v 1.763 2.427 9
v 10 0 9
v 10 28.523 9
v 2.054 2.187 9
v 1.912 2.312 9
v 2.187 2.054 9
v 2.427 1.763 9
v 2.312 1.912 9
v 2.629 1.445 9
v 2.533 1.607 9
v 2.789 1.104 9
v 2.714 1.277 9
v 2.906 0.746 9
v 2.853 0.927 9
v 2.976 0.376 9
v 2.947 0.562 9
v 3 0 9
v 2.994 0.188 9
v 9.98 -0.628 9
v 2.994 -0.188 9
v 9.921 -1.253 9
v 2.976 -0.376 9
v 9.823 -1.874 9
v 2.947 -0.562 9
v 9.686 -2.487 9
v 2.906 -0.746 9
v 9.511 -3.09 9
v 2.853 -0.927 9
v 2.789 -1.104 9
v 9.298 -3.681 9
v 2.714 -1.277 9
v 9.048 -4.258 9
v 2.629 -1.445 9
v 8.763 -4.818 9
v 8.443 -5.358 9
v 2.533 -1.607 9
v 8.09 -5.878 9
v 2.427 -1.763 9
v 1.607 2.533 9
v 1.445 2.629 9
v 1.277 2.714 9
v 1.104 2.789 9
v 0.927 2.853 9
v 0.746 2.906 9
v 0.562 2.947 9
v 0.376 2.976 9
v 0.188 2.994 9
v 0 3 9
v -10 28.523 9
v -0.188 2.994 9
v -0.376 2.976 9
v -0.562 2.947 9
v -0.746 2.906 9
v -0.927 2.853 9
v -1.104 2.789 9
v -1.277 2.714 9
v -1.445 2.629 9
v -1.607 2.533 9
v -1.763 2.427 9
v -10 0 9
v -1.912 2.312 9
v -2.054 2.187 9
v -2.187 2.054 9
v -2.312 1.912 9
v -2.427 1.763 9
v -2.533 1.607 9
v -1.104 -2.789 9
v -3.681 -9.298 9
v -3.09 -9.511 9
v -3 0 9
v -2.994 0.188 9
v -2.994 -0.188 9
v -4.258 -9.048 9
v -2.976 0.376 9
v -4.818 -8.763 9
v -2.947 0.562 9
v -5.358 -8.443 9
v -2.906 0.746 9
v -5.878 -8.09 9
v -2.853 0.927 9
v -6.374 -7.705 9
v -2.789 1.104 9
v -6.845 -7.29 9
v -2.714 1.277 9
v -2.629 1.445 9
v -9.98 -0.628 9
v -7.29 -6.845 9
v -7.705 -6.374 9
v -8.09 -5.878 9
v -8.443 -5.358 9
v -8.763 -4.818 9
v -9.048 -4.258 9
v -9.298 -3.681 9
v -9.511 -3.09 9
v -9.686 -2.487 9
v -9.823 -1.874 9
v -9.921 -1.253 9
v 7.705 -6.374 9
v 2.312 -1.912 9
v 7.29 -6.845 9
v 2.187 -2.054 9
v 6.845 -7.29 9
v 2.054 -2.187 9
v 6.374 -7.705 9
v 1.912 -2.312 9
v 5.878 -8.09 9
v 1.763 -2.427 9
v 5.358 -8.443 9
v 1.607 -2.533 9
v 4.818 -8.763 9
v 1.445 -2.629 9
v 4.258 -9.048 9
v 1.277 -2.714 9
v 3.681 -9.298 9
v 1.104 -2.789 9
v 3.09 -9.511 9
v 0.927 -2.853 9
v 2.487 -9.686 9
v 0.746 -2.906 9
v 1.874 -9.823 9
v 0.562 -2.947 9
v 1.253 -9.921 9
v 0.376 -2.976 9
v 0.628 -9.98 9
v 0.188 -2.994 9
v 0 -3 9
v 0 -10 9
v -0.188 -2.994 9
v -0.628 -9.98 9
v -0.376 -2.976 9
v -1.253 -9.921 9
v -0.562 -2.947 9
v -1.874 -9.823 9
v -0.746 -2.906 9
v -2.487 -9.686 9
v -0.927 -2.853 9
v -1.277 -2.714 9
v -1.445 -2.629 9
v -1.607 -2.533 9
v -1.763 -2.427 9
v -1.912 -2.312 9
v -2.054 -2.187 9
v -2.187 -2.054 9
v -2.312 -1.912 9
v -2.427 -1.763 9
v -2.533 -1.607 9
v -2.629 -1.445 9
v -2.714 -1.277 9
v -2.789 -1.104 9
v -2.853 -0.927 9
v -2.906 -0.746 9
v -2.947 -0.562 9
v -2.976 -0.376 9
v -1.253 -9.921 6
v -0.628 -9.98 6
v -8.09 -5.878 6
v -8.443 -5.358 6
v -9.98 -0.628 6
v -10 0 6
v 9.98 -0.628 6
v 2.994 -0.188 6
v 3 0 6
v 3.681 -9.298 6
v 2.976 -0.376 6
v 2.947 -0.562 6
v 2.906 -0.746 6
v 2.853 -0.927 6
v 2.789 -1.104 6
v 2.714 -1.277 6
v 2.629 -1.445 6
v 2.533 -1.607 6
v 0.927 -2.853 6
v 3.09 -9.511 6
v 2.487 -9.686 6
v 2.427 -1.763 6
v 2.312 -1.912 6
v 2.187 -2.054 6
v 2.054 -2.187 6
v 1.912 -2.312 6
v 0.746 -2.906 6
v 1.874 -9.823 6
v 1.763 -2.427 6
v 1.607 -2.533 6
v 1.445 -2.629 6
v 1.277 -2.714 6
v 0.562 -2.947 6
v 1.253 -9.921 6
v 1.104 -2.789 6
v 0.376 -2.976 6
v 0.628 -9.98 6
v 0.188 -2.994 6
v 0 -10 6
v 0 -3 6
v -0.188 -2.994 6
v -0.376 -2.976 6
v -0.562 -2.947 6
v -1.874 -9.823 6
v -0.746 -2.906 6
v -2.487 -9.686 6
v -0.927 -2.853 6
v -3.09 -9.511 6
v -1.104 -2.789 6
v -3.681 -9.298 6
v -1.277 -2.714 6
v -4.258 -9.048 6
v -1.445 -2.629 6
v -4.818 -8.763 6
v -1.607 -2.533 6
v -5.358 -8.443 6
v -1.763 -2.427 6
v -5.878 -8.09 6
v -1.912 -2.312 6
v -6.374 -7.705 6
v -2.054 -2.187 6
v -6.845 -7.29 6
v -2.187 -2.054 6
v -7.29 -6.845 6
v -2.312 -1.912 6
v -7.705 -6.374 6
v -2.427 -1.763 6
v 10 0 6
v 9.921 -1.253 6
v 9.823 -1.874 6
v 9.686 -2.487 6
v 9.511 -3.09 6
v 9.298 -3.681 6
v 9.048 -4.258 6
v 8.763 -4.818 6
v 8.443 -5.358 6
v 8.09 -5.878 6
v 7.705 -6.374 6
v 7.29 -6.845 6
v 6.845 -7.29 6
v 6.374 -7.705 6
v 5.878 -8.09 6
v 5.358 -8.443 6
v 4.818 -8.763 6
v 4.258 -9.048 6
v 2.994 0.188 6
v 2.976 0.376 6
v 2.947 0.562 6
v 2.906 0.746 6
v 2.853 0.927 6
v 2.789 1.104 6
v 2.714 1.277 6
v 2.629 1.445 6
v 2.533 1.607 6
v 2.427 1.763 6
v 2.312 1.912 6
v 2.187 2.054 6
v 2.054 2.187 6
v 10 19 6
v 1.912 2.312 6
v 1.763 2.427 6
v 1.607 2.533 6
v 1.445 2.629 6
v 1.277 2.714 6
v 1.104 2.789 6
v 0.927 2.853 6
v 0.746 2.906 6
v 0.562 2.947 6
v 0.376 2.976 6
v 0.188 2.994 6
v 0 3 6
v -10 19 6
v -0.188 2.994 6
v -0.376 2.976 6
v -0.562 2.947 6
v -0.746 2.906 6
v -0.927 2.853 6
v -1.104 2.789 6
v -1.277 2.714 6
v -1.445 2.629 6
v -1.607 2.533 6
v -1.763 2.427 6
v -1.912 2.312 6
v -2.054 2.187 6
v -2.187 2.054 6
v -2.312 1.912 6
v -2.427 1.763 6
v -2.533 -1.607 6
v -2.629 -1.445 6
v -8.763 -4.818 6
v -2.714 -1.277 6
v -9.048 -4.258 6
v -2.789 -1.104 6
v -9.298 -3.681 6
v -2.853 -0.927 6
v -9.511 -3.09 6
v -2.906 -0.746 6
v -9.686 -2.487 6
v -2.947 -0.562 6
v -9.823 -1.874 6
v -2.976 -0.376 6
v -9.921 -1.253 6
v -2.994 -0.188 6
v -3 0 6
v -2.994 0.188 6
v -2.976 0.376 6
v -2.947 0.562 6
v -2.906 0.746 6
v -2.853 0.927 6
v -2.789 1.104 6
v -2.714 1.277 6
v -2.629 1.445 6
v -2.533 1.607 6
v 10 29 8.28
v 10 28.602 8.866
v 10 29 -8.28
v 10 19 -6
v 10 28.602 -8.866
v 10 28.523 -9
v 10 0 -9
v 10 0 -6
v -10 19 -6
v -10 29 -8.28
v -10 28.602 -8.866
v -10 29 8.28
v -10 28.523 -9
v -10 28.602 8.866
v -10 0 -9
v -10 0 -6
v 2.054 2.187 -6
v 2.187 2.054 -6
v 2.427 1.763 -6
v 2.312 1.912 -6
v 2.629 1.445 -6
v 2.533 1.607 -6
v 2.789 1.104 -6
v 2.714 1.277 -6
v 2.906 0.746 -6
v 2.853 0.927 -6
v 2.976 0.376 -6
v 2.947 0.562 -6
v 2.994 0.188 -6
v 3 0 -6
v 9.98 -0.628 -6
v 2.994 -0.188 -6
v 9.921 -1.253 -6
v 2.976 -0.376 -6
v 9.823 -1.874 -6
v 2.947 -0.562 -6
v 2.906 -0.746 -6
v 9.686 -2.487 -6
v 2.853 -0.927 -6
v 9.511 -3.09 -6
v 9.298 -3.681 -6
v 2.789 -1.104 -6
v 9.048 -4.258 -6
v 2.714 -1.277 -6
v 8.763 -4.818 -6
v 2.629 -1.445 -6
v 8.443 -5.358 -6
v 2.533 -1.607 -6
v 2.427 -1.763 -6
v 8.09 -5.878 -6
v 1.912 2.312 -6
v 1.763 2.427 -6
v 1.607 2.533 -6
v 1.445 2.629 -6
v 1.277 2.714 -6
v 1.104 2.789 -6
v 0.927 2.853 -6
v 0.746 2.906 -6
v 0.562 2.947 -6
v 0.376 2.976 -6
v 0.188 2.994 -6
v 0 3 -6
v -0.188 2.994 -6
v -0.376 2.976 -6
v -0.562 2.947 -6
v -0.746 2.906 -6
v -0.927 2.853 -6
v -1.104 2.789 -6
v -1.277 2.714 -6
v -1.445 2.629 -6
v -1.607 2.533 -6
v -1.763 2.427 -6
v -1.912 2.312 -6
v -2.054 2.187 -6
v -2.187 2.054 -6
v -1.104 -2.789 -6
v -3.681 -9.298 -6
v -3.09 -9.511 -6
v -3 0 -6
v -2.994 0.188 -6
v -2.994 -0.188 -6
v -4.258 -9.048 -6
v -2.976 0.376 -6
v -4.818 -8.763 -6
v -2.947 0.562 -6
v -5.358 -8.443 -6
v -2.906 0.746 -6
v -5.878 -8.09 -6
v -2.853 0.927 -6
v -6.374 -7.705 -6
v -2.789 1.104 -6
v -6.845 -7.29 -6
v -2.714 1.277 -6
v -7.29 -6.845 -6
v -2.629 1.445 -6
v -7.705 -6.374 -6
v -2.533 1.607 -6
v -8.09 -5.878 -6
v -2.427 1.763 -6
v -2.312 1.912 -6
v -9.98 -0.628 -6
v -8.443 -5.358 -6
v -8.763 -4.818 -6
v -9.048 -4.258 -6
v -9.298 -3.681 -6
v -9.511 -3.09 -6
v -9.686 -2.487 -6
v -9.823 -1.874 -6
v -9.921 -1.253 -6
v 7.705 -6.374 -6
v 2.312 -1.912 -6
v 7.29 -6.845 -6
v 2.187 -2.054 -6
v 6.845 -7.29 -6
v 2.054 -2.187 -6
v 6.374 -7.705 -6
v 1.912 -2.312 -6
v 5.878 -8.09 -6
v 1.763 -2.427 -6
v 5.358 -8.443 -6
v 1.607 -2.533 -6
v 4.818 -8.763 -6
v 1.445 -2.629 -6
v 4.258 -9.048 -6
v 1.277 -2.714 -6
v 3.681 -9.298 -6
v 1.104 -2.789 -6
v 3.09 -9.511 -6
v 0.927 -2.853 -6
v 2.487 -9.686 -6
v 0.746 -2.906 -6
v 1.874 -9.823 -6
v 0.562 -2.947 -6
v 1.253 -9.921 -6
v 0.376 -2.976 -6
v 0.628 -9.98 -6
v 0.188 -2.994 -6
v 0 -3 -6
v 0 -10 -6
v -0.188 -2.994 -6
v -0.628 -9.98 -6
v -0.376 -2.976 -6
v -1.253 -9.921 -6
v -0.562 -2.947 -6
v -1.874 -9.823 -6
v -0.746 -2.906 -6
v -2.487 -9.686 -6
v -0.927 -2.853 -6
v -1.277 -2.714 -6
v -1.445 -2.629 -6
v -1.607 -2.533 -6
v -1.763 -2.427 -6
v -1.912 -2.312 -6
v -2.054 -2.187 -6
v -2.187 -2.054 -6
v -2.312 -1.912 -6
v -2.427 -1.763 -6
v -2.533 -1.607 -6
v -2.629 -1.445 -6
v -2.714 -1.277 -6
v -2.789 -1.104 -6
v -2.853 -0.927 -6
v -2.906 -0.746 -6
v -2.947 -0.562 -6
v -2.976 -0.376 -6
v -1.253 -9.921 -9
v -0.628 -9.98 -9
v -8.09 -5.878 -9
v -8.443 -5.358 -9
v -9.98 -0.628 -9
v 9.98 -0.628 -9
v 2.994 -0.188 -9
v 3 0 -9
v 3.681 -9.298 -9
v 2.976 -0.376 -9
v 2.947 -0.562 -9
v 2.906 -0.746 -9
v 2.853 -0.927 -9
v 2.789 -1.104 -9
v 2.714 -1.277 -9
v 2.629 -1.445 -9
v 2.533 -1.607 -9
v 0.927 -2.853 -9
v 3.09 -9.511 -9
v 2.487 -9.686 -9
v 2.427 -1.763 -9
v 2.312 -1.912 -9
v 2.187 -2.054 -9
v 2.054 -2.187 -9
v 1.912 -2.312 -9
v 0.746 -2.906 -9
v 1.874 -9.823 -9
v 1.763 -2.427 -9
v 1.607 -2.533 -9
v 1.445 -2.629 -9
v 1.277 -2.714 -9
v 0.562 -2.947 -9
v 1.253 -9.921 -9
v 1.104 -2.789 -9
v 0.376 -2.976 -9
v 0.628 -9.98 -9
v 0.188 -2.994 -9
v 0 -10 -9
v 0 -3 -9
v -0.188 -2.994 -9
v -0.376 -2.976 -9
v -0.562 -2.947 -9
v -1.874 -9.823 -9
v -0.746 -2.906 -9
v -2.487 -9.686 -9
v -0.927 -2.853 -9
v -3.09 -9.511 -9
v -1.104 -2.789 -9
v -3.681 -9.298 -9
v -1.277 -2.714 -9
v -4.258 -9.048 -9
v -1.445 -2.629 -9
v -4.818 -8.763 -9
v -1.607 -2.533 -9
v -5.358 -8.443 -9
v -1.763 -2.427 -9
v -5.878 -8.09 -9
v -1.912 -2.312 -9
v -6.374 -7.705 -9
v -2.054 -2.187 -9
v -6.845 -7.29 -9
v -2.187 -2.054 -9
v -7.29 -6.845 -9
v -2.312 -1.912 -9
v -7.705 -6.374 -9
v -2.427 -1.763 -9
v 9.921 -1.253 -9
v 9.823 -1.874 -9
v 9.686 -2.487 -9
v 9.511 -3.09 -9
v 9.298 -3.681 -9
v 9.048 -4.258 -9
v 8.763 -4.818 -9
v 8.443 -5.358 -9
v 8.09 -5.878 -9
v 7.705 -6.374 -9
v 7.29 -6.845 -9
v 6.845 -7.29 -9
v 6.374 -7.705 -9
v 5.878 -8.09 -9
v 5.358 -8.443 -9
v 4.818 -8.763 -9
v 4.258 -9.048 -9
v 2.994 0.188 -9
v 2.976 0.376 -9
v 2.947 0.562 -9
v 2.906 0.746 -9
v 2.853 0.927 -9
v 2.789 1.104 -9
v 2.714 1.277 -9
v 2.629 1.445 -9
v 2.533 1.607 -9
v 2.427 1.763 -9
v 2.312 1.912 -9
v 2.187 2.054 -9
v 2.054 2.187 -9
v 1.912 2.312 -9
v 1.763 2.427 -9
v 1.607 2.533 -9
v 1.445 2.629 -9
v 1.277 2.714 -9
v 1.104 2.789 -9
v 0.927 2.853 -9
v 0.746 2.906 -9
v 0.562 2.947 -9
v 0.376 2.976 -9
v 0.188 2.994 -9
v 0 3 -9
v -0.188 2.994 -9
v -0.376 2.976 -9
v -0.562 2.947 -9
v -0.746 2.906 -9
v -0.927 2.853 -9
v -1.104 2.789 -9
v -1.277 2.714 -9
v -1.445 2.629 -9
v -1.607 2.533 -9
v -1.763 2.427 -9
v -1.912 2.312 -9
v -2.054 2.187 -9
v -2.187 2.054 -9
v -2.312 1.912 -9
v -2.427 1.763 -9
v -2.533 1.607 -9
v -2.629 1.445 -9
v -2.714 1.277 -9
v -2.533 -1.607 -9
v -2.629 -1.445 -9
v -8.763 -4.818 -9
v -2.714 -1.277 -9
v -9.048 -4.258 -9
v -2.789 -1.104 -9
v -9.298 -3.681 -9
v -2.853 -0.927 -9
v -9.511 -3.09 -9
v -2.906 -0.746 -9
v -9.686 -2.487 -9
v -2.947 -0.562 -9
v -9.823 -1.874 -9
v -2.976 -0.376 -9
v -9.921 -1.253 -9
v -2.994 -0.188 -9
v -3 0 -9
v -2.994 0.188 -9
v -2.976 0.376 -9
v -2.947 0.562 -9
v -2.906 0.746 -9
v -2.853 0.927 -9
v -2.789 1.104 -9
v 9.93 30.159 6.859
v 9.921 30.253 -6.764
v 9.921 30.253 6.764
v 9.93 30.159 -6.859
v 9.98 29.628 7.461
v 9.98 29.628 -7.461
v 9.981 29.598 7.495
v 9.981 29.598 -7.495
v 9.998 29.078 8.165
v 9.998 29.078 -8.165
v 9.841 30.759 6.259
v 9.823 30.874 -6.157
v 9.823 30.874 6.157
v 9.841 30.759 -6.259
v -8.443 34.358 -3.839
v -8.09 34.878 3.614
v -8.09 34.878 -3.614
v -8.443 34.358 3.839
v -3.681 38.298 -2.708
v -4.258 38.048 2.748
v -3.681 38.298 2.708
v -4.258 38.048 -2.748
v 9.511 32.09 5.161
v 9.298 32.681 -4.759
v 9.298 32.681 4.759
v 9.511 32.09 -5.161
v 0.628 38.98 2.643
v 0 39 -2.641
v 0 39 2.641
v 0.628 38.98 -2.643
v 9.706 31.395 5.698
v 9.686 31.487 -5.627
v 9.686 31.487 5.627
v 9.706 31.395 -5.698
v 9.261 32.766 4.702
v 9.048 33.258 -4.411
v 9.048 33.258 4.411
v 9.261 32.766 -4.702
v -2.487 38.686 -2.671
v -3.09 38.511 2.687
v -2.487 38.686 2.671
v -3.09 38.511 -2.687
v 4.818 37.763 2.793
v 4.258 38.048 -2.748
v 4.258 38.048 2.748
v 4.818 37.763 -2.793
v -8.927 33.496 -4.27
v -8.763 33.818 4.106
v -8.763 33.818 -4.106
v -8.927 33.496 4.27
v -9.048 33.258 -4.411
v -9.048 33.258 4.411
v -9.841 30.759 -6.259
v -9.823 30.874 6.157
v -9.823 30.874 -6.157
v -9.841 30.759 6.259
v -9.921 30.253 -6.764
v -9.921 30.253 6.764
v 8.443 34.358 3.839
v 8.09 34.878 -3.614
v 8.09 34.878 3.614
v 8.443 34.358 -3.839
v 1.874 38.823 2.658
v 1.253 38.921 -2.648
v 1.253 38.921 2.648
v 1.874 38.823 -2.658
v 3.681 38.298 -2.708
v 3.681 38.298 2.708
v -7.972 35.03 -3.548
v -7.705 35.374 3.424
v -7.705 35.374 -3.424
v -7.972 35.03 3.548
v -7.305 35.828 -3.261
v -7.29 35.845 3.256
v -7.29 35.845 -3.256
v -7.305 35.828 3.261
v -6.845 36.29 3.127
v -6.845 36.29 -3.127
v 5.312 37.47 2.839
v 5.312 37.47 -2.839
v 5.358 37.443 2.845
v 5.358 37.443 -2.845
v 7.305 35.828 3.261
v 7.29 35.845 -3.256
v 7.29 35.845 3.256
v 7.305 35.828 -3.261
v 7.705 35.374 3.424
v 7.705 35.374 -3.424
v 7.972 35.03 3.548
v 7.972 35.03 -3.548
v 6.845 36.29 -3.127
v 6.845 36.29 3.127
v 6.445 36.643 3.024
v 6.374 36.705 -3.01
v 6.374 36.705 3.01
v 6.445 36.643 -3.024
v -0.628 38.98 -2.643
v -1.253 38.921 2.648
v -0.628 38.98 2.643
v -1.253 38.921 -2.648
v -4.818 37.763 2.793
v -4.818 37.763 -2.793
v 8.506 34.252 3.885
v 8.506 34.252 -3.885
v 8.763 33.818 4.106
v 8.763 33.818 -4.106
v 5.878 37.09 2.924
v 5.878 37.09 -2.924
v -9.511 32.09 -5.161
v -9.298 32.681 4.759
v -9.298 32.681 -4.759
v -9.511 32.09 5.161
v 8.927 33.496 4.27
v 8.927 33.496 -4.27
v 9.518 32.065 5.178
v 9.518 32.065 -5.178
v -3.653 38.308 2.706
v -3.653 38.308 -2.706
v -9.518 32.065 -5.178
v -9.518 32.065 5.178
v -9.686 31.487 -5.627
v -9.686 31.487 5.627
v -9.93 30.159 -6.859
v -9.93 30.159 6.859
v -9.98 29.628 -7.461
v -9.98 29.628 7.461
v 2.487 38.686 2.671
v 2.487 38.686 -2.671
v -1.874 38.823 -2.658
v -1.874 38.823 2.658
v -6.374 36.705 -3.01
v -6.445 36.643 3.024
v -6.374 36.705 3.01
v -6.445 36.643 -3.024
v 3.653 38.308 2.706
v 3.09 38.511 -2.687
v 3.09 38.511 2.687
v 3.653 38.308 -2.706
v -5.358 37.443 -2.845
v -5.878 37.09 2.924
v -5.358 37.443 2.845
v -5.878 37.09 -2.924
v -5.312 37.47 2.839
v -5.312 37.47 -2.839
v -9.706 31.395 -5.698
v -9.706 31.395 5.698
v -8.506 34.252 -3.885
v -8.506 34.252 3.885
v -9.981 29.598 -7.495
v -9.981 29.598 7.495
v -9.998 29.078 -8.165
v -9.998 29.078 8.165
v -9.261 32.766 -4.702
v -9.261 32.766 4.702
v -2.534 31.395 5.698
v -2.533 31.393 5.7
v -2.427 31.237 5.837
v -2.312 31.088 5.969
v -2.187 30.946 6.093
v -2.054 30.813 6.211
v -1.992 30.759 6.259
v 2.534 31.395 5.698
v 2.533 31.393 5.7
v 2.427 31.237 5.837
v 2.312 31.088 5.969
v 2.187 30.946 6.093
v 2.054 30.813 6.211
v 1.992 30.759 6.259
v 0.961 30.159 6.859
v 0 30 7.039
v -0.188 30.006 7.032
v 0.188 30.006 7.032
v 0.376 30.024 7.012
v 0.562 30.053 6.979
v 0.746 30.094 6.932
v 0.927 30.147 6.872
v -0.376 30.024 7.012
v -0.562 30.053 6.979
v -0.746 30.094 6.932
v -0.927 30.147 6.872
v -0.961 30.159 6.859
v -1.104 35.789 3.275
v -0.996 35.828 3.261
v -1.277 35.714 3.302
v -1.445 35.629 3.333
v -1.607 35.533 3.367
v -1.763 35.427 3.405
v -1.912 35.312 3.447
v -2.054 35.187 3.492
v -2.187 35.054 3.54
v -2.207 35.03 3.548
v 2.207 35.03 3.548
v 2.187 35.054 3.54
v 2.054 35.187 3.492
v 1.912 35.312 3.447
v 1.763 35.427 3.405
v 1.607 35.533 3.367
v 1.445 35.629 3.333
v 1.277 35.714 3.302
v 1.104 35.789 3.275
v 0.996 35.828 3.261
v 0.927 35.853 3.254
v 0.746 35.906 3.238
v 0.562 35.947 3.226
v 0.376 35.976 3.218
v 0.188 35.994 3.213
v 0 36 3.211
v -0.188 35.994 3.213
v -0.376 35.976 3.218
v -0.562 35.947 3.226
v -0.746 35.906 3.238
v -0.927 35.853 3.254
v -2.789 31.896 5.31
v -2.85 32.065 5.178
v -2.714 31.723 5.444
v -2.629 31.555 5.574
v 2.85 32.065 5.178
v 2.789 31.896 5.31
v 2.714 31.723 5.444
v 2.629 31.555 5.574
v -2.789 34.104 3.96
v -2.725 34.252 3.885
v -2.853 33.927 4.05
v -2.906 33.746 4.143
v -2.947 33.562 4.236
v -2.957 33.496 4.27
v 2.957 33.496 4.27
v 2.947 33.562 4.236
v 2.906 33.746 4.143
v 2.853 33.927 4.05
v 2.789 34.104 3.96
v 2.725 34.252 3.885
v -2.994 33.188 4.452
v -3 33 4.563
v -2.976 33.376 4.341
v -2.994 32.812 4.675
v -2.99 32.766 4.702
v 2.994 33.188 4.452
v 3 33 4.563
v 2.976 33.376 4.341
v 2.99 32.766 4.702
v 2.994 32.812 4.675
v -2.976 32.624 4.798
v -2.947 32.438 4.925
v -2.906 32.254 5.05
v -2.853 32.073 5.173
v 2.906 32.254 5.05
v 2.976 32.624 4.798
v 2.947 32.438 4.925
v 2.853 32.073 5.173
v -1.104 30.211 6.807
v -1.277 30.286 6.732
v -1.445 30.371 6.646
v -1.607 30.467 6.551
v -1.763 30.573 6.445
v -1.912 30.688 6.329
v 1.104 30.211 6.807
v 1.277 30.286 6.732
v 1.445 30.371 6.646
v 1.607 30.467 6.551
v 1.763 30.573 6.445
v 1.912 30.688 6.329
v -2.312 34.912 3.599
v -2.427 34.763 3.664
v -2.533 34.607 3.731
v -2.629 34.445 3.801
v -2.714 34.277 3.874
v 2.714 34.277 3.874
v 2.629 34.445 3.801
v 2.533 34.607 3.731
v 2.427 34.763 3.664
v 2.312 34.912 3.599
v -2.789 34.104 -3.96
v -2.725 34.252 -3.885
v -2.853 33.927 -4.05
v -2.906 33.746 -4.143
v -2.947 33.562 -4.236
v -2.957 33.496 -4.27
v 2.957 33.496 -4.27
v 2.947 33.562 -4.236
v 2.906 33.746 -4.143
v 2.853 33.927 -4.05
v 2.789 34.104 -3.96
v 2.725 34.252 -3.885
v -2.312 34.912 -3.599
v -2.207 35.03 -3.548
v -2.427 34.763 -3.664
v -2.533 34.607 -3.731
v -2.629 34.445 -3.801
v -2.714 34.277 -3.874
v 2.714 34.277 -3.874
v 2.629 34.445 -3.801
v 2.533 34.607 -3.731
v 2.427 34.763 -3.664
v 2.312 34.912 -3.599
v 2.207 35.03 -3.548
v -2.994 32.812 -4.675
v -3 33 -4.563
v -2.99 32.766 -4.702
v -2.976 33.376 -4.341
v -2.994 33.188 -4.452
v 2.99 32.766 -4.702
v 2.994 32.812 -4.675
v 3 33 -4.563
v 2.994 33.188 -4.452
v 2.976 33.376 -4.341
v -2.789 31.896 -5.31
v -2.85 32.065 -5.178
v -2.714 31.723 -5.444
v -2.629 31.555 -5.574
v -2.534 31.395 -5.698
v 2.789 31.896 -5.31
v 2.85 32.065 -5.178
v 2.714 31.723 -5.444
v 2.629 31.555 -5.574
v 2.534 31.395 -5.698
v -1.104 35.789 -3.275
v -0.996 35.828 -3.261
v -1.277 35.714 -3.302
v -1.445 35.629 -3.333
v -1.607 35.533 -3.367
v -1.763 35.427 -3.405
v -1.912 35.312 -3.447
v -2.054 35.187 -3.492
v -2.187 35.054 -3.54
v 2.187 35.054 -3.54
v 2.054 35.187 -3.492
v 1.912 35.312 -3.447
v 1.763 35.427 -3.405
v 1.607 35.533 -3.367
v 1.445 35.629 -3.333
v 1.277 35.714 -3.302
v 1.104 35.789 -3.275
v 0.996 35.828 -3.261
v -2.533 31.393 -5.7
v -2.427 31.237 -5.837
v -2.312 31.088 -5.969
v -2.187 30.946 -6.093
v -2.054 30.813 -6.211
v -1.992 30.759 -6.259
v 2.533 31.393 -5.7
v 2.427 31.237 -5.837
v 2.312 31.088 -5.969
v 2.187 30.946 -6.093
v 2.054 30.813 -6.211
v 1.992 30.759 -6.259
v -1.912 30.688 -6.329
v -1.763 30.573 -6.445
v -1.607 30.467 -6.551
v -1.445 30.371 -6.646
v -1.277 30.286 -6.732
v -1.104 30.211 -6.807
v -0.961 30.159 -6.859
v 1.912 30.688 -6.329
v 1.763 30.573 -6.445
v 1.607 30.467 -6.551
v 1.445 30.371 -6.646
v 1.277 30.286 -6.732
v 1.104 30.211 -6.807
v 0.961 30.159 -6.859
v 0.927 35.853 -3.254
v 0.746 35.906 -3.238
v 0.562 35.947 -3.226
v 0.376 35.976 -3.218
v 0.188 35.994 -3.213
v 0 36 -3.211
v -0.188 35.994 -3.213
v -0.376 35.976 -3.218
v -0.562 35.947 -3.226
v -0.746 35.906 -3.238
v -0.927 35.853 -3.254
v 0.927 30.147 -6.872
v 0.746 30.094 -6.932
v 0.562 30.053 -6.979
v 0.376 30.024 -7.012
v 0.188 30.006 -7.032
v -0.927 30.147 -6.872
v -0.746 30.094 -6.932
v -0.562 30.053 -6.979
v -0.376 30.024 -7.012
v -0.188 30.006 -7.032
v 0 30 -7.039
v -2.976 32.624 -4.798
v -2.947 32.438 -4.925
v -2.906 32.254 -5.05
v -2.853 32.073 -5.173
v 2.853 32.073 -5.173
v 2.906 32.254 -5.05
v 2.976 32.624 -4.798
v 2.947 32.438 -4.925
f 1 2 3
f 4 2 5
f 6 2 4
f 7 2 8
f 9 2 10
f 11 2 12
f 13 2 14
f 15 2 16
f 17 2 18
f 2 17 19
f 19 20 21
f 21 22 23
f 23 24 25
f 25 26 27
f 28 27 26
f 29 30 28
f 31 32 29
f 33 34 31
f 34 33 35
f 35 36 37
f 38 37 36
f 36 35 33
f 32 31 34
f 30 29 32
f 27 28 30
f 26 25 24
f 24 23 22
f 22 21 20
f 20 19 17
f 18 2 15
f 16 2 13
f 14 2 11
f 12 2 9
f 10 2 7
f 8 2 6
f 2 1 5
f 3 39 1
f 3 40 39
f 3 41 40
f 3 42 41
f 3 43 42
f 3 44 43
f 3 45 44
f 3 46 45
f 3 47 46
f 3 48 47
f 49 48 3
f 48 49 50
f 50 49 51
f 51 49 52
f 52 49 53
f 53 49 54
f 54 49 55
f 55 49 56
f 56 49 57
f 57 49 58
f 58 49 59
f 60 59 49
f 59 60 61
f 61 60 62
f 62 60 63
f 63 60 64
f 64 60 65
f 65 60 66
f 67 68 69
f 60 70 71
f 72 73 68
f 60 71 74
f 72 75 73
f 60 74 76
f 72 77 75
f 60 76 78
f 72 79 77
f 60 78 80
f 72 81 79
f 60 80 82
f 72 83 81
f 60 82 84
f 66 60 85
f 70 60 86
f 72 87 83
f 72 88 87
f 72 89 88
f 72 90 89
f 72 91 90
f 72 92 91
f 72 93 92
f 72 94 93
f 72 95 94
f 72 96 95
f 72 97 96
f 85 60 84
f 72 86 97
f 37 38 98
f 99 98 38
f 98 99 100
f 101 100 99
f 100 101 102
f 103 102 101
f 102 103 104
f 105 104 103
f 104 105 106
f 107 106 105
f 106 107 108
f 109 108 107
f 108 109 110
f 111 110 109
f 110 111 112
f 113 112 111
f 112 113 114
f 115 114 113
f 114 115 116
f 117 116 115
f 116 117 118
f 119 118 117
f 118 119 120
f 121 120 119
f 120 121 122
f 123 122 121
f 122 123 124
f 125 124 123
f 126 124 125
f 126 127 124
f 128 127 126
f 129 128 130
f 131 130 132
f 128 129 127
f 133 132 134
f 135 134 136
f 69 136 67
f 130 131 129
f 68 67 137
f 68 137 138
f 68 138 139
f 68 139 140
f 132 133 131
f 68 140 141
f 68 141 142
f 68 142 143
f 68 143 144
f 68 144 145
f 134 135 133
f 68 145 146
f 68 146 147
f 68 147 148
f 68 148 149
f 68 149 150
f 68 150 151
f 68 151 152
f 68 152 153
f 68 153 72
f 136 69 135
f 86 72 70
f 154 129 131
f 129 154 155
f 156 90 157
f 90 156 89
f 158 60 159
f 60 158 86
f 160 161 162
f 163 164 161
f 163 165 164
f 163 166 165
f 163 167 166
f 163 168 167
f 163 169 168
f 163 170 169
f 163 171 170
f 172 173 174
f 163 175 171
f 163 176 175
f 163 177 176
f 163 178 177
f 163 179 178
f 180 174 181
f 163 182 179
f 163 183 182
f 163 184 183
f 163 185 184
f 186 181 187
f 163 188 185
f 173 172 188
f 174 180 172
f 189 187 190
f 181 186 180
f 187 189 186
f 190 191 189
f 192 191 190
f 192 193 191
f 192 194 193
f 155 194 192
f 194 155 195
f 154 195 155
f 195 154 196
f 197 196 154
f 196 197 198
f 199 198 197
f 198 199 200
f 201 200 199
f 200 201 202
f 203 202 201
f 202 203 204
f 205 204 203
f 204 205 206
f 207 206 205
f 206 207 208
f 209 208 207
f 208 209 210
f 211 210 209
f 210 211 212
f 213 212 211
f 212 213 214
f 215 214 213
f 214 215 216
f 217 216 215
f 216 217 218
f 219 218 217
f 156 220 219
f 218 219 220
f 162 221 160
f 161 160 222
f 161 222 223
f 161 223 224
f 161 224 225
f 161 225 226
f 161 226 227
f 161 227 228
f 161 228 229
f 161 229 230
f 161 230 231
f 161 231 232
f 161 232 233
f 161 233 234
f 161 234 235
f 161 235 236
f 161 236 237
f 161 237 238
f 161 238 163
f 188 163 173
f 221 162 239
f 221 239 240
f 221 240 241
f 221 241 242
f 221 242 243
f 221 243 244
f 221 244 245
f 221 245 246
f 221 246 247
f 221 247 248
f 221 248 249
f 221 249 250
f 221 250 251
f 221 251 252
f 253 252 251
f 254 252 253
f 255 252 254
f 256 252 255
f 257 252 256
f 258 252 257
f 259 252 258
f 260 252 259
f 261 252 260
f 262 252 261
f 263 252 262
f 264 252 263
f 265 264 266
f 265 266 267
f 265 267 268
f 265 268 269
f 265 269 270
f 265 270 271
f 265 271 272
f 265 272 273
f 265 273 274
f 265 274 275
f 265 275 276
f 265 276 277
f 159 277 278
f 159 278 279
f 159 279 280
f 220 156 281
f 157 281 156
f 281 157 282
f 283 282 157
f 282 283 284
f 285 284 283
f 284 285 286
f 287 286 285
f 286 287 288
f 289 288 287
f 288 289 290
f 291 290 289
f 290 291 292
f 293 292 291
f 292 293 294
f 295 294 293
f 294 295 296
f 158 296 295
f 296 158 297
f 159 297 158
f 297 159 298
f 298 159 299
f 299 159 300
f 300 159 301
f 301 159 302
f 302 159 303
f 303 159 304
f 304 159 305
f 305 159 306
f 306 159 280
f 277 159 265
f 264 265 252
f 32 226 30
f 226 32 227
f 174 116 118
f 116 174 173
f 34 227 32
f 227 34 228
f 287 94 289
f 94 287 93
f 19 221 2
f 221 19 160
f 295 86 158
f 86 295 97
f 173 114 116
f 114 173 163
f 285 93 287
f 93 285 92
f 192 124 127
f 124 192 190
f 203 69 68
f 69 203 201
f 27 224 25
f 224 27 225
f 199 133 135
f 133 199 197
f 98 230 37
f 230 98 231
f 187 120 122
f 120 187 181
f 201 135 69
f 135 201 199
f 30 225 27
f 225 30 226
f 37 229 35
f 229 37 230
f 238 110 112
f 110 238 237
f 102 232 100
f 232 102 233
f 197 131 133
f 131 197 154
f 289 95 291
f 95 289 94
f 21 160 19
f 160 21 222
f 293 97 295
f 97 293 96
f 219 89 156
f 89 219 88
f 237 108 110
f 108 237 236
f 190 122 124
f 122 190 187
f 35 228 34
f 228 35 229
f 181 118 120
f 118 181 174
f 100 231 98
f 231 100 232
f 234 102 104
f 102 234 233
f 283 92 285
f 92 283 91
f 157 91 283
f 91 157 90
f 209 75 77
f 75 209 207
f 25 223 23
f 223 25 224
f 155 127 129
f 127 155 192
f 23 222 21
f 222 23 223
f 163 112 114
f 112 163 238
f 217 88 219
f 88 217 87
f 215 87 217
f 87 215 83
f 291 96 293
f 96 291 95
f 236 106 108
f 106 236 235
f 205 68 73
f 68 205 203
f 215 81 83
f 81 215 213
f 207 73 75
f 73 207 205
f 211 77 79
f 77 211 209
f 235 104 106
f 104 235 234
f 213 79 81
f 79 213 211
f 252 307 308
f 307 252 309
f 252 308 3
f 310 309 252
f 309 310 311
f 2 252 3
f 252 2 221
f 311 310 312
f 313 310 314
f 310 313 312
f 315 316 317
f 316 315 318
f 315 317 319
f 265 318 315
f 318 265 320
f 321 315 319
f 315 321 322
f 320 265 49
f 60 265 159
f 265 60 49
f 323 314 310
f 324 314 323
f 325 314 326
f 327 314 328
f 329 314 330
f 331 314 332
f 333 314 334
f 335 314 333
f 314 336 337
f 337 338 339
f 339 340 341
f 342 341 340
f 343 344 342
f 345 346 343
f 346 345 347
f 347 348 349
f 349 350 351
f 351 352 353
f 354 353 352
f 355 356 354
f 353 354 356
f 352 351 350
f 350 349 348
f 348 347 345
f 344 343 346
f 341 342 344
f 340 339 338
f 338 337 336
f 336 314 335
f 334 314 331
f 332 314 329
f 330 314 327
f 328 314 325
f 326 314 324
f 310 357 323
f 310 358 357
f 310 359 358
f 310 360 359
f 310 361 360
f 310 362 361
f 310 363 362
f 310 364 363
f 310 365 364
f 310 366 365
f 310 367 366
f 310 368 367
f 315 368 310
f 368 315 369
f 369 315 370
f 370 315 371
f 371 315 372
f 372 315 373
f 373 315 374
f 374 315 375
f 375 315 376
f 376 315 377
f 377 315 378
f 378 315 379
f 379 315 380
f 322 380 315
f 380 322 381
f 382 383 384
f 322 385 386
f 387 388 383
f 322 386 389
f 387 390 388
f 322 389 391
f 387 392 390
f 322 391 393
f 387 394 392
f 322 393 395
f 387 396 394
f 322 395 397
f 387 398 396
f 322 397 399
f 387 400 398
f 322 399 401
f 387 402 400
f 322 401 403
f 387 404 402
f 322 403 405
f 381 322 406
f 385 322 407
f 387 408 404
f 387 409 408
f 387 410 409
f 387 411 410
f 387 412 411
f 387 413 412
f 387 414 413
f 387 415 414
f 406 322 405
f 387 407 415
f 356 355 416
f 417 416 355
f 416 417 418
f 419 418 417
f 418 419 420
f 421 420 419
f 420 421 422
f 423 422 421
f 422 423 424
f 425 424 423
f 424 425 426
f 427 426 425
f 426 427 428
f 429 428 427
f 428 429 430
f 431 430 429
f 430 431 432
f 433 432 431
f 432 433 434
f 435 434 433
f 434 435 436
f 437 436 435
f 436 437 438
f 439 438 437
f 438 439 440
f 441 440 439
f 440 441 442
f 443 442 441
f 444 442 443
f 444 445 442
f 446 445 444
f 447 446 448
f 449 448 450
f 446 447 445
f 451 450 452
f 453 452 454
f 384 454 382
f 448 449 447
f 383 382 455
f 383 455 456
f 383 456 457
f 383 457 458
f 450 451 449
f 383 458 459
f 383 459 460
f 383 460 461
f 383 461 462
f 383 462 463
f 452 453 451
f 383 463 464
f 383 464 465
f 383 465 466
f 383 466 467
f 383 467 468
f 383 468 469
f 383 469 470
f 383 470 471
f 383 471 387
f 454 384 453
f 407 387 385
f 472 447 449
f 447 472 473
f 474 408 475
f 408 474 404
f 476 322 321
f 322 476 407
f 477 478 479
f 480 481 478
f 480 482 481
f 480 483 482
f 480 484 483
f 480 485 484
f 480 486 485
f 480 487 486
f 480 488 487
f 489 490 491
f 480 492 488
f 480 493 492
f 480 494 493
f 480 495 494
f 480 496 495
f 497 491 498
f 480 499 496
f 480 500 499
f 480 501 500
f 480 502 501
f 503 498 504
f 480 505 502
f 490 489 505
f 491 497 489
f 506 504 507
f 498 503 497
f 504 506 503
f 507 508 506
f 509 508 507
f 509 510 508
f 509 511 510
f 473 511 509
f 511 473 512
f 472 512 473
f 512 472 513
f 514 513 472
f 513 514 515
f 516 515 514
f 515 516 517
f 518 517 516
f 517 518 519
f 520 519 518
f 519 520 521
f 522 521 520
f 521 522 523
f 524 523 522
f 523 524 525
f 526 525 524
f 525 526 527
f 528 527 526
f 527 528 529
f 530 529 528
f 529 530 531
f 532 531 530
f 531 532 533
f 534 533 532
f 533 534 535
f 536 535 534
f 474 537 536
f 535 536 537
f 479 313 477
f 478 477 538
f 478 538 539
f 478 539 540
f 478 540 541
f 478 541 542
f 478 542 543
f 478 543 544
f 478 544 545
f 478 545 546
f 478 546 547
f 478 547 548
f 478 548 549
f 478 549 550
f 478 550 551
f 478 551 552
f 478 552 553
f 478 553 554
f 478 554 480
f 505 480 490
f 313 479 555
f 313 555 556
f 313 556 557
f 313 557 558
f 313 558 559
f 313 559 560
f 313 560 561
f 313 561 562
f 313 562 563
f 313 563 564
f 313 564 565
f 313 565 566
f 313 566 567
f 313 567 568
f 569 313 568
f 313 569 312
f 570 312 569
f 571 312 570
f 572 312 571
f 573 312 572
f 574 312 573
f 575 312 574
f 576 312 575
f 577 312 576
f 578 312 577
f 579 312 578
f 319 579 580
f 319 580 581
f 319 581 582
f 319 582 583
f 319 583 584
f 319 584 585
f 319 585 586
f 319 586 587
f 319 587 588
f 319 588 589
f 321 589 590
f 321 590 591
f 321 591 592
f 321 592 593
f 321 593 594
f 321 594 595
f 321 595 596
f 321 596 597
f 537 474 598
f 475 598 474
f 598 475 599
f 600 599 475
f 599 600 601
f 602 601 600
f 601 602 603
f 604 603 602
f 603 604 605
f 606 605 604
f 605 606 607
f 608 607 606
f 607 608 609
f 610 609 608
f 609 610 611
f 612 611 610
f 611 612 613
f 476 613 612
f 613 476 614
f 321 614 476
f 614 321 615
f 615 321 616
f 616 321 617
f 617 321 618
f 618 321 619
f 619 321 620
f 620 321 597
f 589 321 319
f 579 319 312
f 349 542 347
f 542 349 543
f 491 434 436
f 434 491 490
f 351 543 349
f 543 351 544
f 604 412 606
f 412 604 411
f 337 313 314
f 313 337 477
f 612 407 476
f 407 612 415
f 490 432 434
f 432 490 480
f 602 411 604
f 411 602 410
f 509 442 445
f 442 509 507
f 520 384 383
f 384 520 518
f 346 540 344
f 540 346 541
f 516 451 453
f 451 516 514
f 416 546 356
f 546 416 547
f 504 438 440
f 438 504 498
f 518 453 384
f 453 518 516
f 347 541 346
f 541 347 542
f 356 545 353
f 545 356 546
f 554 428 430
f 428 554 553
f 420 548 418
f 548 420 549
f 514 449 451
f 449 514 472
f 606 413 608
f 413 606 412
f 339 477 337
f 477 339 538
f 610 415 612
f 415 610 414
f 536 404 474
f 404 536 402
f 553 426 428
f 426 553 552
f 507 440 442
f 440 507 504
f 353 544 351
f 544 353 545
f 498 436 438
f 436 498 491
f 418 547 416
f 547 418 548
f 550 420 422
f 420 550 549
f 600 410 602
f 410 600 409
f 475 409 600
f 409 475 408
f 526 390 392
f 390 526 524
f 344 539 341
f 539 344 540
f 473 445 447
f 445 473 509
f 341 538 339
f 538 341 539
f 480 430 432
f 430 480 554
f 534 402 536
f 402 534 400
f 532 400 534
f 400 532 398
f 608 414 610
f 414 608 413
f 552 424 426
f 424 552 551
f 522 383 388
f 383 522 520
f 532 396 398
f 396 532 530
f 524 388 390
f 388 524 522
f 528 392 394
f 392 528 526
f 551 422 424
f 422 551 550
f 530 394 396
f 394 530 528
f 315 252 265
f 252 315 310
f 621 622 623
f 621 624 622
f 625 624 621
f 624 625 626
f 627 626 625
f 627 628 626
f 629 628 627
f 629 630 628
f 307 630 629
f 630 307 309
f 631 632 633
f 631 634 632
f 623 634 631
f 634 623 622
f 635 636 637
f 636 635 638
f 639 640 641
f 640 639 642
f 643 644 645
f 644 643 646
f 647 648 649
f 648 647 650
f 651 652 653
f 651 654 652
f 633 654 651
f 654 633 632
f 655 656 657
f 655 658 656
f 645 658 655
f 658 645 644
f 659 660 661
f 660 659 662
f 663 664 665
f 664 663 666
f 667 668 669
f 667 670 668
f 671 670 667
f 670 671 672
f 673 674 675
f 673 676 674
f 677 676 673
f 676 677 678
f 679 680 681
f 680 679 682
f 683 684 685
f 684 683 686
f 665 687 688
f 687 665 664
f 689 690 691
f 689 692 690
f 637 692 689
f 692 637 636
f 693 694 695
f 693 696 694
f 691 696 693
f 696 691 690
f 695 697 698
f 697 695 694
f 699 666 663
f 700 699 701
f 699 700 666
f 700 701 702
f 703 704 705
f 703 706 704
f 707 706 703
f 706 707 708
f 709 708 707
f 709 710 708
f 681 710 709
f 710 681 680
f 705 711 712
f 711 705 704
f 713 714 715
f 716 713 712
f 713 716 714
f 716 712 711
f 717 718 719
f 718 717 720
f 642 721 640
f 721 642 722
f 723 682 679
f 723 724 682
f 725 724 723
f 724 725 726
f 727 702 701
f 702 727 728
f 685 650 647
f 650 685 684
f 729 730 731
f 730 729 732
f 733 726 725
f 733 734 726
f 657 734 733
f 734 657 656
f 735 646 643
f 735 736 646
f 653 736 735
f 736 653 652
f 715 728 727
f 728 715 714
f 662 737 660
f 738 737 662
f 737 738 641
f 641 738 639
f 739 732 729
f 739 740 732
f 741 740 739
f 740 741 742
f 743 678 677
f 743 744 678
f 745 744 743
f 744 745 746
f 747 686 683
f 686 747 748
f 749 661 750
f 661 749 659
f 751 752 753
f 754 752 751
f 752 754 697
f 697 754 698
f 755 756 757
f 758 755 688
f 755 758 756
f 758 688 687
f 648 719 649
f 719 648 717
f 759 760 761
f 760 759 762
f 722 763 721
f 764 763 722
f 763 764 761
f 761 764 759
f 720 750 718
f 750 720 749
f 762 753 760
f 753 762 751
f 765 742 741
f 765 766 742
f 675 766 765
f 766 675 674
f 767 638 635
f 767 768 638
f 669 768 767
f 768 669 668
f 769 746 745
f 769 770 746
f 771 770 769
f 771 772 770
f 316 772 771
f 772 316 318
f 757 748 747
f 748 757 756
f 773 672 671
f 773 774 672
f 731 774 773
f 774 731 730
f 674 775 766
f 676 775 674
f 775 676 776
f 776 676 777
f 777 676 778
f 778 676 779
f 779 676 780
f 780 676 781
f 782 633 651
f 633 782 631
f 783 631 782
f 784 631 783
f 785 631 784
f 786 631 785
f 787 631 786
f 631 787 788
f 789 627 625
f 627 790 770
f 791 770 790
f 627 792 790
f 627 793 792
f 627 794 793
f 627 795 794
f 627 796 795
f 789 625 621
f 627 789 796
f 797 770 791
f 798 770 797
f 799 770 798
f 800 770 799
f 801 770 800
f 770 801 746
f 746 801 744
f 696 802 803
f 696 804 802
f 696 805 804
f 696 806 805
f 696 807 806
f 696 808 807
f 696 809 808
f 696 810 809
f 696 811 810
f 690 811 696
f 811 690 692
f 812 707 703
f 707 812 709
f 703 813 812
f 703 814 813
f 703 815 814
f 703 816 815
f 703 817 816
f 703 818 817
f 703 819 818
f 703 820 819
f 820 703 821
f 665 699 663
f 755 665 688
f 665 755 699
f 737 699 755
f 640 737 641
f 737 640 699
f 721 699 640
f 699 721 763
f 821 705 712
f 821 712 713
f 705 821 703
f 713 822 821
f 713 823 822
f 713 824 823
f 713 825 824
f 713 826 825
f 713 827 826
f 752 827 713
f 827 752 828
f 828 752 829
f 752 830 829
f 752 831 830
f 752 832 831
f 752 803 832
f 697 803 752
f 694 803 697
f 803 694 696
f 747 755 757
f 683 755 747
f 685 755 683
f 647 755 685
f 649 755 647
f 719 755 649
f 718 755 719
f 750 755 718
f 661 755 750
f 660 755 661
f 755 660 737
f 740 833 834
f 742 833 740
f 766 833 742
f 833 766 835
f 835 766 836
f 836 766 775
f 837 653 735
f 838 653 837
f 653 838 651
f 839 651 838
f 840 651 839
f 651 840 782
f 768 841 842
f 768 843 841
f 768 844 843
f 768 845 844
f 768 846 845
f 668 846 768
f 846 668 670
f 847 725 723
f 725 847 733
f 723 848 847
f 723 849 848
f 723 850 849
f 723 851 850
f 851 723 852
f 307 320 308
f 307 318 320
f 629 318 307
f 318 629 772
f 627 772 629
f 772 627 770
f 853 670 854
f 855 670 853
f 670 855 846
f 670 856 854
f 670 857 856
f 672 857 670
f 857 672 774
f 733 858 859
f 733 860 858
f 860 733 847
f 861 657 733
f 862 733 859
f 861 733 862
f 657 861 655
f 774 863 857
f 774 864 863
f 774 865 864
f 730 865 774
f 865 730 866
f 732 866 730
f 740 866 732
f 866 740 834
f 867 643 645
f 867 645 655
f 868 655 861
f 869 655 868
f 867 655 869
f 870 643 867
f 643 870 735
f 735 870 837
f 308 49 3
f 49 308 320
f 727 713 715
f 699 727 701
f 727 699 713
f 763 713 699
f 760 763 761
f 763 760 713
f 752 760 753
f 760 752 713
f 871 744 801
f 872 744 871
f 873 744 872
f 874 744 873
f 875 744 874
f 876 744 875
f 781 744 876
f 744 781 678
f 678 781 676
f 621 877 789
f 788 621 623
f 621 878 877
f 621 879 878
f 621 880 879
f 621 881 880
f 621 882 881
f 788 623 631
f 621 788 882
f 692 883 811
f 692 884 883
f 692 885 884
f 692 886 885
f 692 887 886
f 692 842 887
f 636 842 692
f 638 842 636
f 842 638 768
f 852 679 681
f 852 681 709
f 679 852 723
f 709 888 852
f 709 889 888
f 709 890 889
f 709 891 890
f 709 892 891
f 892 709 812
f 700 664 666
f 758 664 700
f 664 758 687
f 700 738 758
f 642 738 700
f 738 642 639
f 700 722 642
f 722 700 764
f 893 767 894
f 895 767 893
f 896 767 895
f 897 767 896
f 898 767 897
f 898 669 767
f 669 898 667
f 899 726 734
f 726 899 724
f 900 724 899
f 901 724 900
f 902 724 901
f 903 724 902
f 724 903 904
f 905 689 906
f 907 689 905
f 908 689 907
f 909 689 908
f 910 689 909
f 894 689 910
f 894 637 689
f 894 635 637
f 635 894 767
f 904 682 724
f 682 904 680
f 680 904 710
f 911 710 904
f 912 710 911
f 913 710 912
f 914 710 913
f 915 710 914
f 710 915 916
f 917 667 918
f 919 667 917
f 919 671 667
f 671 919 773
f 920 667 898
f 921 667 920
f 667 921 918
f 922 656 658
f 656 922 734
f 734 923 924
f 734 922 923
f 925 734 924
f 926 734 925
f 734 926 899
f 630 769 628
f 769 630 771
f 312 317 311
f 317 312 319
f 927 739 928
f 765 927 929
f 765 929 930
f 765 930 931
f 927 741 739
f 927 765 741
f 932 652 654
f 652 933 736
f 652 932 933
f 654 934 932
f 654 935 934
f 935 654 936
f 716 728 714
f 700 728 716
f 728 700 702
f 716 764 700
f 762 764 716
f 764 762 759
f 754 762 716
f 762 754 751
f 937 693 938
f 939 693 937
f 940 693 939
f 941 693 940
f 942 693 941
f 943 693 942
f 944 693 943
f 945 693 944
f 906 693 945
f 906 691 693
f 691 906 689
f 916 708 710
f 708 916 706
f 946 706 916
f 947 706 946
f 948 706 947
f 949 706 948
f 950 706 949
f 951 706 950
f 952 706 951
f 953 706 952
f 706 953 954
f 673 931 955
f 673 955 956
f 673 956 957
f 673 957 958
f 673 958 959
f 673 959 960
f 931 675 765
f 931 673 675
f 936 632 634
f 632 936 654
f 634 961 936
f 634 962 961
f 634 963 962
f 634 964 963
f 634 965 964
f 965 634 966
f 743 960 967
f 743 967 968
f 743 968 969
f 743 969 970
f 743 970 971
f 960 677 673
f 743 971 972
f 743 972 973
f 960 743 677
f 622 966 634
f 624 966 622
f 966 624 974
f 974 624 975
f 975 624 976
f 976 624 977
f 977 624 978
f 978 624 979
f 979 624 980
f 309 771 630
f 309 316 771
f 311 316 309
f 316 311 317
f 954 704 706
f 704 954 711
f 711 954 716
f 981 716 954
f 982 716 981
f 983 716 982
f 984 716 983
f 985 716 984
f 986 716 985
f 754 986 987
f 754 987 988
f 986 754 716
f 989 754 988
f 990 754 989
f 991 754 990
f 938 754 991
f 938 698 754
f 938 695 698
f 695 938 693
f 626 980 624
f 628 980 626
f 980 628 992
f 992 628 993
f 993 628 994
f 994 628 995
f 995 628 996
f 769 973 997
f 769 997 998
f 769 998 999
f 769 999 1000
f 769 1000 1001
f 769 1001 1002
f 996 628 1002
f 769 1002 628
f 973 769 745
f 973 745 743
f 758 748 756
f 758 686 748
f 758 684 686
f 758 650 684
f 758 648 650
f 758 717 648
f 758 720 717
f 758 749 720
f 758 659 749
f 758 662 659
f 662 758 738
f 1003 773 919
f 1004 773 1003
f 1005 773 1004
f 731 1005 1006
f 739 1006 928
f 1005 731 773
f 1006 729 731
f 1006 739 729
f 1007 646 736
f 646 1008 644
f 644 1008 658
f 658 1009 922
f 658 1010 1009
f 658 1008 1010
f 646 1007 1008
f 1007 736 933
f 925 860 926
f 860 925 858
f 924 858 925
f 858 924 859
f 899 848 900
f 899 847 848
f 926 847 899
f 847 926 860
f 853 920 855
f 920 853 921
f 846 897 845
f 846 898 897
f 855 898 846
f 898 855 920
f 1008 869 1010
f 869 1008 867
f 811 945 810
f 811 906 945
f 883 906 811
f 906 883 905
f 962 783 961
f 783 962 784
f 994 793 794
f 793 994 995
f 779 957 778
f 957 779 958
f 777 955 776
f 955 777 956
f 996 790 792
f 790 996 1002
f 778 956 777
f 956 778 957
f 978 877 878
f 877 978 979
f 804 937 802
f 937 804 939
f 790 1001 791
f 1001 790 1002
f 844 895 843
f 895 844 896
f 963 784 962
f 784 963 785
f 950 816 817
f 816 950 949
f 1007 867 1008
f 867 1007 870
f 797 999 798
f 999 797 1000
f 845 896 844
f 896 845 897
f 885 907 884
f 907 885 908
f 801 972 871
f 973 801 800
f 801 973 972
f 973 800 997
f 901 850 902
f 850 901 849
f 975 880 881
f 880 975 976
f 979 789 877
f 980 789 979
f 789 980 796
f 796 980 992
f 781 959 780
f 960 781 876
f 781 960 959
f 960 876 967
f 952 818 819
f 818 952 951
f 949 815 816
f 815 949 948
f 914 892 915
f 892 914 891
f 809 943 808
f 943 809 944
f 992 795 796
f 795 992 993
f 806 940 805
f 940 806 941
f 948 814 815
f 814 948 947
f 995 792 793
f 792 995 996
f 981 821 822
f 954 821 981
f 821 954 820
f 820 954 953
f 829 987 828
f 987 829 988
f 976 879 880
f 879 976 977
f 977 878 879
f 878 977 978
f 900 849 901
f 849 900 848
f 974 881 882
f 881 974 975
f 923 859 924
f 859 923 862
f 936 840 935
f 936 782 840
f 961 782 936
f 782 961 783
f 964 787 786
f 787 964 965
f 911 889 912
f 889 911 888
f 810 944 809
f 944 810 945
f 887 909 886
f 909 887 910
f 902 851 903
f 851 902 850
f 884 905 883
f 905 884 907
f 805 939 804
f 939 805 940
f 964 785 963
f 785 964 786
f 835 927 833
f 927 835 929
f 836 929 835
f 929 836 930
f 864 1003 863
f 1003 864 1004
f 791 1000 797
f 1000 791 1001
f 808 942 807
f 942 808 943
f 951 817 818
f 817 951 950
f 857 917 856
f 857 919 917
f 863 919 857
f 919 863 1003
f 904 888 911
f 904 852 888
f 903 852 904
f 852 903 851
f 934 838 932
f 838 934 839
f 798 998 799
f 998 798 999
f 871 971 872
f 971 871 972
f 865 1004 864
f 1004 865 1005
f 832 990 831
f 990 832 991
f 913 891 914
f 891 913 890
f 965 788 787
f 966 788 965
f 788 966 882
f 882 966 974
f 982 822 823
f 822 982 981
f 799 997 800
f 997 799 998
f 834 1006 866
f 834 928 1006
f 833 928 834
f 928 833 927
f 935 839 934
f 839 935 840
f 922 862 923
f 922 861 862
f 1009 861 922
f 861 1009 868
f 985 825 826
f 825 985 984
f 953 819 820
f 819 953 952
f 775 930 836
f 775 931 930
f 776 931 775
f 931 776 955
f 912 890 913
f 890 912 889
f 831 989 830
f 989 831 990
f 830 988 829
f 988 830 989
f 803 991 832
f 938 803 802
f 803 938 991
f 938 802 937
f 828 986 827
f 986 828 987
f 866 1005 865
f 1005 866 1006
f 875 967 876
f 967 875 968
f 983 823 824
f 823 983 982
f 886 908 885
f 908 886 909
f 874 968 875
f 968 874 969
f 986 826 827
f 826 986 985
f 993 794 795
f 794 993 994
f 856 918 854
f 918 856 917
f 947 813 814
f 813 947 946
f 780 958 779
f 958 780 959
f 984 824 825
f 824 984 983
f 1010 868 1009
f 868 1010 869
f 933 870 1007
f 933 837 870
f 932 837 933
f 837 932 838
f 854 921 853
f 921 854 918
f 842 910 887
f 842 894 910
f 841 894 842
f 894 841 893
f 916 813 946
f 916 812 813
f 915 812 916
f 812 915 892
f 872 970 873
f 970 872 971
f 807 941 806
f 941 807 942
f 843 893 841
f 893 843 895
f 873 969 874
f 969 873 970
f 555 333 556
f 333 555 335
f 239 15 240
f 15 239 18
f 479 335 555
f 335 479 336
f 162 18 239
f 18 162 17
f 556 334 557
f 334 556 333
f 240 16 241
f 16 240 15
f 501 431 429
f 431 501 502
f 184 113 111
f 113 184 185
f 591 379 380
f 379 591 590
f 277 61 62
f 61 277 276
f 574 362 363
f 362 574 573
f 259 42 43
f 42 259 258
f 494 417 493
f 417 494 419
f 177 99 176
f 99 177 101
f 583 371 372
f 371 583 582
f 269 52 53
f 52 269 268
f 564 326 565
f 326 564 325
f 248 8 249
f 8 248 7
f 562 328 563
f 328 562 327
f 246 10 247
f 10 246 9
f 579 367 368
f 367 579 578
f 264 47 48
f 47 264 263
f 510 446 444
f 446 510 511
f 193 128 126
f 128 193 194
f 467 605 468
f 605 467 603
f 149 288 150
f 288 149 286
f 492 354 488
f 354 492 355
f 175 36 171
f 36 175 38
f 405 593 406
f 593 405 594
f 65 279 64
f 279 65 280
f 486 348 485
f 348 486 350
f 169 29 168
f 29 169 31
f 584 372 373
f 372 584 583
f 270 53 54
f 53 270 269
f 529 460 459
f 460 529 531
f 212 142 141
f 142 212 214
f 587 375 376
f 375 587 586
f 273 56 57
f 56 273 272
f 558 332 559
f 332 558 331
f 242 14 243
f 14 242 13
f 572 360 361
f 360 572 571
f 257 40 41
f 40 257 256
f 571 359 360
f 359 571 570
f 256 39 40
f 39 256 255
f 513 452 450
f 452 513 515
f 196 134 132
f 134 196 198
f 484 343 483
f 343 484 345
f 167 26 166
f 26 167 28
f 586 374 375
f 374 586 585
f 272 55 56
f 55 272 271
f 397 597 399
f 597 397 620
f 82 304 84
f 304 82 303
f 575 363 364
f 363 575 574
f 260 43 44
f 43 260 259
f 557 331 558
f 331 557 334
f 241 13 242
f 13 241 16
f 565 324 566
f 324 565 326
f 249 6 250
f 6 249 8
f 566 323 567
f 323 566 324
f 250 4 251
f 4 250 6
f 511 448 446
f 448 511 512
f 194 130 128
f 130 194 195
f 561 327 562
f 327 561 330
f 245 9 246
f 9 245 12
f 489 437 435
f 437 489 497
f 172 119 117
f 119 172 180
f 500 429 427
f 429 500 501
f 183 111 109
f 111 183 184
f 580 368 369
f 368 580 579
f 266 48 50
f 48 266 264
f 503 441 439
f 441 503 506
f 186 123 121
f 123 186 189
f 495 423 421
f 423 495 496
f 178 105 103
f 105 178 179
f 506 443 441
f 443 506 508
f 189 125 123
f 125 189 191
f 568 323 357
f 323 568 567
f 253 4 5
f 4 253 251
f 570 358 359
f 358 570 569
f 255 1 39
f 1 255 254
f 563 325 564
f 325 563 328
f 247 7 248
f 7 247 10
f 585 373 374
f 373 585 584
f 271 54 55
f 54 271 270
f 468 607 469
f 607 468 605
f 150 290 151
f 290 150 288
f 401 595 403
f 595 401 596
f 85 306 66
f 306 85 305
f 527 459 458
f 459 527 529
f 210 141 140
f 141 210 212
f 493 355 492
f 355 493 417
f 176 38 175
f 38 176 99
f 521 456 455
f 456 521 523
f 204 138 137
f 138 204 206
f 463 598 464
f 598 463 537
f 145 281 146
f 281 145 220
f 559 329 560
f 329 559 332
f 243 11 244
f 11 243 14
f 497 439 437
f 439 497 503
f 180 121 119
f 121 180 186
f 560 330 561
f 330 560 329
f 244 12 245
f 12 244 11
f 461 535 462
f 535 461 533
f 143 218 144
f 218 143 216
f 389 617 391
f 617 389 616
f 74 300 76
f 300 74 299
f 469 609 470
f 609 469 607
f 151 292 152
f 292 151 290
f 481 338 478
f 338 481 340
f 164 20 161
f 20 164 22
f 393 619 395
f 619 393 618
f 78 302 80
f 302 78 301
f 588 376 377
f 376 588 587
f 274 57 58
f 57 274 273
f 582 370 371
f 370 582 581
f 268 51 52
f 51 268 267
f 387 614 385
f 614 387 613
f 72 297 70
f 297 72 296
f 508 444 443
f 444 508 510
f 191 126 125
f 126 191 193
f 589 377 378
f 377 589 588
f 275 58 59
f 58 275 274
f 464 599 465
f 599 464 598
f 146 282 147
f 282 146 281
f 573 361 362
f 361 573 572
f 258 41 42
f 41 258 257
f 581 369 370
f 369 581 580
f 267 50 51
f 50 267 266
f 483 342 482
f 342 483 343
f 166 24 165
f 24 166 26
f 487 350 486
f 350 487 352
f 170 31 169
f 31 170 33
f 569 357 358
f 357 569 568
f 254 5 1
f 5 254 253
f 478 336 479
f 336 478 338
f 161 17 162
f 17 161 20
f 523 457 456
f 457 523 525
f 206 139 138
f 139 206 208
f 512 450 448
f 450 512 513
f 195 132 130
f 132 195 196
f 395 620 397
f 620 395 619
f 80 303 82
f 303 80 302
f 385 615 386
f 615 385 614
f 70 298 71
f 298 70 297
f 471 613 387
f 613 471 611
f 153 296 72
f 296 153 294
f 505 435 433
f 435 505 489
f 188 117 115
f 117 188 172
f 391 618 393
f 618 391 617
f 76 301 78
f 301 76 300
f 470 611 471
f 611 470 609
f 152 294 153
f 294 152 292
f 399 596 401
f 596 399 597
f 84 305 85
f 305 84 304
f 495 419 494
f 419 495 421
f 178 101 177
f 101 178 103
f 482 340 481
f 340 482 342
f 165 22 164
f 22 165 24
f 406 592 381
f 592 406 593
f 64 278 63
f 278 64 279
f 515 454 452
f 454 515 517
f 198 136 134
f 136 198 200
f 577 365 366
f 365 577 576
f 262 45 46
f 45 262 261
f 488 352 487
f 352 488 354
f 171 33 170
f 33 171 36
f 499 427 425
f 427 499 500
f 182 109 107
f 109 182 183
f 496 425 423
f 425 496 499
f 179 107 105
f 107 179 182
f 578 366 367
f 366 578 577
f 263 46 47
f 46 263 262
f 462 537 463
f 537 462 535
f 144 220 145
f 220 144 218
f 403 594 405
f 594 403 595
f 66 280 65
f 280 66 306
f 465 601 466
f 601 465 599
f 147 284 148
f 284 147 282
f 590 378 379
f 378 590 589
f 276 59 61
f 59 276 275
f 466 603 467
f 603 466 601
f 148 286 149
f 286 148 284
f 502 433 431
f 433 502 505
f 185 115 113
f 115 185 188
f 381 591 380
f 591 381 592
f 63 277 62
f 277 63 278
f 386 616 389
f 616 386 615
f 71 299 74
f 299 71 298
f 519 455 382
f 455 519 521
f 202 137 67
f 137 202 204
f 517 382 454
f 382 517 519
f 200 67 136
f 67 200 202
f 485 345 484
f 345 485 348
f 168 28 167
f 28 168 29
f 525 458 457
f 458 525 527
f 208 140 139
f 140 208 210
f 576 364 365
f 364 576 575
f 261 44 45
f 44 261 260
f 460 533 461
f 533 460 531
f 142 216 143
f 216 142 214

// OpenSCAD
// file: wheels.scad
//
// Just the wheel
//


module torus(ringDiam, torusDiam) { 
	rotate_extrude(convexity = ringDiam, $fn = 100) {
		translate([ringDiam / 2, 0, 0]) {
			circle(r = torusDiam / 2, $fn = 100);
		}
	}
} 

module wheel(ringDiam, torusDiam, axisDiam) {  
  difference() {
    cylinder(h=1.1 * torusDiam, r=(ringDiam / 2), center=true, $fn=100); // Thw wheel of the Pulley
    cylinder(h=12, r=(axisDiam / 2), center=true, $fn=100);  // Axis
    torus(ringDiam, torusDiam);                 // The groove
  }
}

// Go !
ringDiam = 30;
torusDiam = 10;  // aka line diam
axisDiam = 6;

// For tests

union() {
    wheel(ringDiam, torusDiam, axisDiam);
}
// main file
//
// A Block with its wheel.
// Becket: ringot (fr)
//
// See drawing options at the bottom of the code.
//

use <./wheels.scad>
use <./blocks.scad>

// Go !
ringDiam = 30;
torusDiam = 10;  // aka line diam
axisDiam = 6;
cheekThickness = 3;
cheekWidth = 20;

OPTION_FULL = 0;
OPTION_WHEEL_ONLY = 1;
OPTION_BLOCK_ONLY = 2;

option = OPTION_BLOCK_ONLY;

union() {
  if (option != OPTION_BLOCK_ONLY) {
    wheel(ringDiam, torusDiam, axisDiam);
  }
  if (option != OPTION_WHEEL_ONLY) {
    block(cheekThickness, cheekWidth, torusDiam * 1.2, (ringDiam / 2) + (torusDiam / 2), 6);
  }
}
